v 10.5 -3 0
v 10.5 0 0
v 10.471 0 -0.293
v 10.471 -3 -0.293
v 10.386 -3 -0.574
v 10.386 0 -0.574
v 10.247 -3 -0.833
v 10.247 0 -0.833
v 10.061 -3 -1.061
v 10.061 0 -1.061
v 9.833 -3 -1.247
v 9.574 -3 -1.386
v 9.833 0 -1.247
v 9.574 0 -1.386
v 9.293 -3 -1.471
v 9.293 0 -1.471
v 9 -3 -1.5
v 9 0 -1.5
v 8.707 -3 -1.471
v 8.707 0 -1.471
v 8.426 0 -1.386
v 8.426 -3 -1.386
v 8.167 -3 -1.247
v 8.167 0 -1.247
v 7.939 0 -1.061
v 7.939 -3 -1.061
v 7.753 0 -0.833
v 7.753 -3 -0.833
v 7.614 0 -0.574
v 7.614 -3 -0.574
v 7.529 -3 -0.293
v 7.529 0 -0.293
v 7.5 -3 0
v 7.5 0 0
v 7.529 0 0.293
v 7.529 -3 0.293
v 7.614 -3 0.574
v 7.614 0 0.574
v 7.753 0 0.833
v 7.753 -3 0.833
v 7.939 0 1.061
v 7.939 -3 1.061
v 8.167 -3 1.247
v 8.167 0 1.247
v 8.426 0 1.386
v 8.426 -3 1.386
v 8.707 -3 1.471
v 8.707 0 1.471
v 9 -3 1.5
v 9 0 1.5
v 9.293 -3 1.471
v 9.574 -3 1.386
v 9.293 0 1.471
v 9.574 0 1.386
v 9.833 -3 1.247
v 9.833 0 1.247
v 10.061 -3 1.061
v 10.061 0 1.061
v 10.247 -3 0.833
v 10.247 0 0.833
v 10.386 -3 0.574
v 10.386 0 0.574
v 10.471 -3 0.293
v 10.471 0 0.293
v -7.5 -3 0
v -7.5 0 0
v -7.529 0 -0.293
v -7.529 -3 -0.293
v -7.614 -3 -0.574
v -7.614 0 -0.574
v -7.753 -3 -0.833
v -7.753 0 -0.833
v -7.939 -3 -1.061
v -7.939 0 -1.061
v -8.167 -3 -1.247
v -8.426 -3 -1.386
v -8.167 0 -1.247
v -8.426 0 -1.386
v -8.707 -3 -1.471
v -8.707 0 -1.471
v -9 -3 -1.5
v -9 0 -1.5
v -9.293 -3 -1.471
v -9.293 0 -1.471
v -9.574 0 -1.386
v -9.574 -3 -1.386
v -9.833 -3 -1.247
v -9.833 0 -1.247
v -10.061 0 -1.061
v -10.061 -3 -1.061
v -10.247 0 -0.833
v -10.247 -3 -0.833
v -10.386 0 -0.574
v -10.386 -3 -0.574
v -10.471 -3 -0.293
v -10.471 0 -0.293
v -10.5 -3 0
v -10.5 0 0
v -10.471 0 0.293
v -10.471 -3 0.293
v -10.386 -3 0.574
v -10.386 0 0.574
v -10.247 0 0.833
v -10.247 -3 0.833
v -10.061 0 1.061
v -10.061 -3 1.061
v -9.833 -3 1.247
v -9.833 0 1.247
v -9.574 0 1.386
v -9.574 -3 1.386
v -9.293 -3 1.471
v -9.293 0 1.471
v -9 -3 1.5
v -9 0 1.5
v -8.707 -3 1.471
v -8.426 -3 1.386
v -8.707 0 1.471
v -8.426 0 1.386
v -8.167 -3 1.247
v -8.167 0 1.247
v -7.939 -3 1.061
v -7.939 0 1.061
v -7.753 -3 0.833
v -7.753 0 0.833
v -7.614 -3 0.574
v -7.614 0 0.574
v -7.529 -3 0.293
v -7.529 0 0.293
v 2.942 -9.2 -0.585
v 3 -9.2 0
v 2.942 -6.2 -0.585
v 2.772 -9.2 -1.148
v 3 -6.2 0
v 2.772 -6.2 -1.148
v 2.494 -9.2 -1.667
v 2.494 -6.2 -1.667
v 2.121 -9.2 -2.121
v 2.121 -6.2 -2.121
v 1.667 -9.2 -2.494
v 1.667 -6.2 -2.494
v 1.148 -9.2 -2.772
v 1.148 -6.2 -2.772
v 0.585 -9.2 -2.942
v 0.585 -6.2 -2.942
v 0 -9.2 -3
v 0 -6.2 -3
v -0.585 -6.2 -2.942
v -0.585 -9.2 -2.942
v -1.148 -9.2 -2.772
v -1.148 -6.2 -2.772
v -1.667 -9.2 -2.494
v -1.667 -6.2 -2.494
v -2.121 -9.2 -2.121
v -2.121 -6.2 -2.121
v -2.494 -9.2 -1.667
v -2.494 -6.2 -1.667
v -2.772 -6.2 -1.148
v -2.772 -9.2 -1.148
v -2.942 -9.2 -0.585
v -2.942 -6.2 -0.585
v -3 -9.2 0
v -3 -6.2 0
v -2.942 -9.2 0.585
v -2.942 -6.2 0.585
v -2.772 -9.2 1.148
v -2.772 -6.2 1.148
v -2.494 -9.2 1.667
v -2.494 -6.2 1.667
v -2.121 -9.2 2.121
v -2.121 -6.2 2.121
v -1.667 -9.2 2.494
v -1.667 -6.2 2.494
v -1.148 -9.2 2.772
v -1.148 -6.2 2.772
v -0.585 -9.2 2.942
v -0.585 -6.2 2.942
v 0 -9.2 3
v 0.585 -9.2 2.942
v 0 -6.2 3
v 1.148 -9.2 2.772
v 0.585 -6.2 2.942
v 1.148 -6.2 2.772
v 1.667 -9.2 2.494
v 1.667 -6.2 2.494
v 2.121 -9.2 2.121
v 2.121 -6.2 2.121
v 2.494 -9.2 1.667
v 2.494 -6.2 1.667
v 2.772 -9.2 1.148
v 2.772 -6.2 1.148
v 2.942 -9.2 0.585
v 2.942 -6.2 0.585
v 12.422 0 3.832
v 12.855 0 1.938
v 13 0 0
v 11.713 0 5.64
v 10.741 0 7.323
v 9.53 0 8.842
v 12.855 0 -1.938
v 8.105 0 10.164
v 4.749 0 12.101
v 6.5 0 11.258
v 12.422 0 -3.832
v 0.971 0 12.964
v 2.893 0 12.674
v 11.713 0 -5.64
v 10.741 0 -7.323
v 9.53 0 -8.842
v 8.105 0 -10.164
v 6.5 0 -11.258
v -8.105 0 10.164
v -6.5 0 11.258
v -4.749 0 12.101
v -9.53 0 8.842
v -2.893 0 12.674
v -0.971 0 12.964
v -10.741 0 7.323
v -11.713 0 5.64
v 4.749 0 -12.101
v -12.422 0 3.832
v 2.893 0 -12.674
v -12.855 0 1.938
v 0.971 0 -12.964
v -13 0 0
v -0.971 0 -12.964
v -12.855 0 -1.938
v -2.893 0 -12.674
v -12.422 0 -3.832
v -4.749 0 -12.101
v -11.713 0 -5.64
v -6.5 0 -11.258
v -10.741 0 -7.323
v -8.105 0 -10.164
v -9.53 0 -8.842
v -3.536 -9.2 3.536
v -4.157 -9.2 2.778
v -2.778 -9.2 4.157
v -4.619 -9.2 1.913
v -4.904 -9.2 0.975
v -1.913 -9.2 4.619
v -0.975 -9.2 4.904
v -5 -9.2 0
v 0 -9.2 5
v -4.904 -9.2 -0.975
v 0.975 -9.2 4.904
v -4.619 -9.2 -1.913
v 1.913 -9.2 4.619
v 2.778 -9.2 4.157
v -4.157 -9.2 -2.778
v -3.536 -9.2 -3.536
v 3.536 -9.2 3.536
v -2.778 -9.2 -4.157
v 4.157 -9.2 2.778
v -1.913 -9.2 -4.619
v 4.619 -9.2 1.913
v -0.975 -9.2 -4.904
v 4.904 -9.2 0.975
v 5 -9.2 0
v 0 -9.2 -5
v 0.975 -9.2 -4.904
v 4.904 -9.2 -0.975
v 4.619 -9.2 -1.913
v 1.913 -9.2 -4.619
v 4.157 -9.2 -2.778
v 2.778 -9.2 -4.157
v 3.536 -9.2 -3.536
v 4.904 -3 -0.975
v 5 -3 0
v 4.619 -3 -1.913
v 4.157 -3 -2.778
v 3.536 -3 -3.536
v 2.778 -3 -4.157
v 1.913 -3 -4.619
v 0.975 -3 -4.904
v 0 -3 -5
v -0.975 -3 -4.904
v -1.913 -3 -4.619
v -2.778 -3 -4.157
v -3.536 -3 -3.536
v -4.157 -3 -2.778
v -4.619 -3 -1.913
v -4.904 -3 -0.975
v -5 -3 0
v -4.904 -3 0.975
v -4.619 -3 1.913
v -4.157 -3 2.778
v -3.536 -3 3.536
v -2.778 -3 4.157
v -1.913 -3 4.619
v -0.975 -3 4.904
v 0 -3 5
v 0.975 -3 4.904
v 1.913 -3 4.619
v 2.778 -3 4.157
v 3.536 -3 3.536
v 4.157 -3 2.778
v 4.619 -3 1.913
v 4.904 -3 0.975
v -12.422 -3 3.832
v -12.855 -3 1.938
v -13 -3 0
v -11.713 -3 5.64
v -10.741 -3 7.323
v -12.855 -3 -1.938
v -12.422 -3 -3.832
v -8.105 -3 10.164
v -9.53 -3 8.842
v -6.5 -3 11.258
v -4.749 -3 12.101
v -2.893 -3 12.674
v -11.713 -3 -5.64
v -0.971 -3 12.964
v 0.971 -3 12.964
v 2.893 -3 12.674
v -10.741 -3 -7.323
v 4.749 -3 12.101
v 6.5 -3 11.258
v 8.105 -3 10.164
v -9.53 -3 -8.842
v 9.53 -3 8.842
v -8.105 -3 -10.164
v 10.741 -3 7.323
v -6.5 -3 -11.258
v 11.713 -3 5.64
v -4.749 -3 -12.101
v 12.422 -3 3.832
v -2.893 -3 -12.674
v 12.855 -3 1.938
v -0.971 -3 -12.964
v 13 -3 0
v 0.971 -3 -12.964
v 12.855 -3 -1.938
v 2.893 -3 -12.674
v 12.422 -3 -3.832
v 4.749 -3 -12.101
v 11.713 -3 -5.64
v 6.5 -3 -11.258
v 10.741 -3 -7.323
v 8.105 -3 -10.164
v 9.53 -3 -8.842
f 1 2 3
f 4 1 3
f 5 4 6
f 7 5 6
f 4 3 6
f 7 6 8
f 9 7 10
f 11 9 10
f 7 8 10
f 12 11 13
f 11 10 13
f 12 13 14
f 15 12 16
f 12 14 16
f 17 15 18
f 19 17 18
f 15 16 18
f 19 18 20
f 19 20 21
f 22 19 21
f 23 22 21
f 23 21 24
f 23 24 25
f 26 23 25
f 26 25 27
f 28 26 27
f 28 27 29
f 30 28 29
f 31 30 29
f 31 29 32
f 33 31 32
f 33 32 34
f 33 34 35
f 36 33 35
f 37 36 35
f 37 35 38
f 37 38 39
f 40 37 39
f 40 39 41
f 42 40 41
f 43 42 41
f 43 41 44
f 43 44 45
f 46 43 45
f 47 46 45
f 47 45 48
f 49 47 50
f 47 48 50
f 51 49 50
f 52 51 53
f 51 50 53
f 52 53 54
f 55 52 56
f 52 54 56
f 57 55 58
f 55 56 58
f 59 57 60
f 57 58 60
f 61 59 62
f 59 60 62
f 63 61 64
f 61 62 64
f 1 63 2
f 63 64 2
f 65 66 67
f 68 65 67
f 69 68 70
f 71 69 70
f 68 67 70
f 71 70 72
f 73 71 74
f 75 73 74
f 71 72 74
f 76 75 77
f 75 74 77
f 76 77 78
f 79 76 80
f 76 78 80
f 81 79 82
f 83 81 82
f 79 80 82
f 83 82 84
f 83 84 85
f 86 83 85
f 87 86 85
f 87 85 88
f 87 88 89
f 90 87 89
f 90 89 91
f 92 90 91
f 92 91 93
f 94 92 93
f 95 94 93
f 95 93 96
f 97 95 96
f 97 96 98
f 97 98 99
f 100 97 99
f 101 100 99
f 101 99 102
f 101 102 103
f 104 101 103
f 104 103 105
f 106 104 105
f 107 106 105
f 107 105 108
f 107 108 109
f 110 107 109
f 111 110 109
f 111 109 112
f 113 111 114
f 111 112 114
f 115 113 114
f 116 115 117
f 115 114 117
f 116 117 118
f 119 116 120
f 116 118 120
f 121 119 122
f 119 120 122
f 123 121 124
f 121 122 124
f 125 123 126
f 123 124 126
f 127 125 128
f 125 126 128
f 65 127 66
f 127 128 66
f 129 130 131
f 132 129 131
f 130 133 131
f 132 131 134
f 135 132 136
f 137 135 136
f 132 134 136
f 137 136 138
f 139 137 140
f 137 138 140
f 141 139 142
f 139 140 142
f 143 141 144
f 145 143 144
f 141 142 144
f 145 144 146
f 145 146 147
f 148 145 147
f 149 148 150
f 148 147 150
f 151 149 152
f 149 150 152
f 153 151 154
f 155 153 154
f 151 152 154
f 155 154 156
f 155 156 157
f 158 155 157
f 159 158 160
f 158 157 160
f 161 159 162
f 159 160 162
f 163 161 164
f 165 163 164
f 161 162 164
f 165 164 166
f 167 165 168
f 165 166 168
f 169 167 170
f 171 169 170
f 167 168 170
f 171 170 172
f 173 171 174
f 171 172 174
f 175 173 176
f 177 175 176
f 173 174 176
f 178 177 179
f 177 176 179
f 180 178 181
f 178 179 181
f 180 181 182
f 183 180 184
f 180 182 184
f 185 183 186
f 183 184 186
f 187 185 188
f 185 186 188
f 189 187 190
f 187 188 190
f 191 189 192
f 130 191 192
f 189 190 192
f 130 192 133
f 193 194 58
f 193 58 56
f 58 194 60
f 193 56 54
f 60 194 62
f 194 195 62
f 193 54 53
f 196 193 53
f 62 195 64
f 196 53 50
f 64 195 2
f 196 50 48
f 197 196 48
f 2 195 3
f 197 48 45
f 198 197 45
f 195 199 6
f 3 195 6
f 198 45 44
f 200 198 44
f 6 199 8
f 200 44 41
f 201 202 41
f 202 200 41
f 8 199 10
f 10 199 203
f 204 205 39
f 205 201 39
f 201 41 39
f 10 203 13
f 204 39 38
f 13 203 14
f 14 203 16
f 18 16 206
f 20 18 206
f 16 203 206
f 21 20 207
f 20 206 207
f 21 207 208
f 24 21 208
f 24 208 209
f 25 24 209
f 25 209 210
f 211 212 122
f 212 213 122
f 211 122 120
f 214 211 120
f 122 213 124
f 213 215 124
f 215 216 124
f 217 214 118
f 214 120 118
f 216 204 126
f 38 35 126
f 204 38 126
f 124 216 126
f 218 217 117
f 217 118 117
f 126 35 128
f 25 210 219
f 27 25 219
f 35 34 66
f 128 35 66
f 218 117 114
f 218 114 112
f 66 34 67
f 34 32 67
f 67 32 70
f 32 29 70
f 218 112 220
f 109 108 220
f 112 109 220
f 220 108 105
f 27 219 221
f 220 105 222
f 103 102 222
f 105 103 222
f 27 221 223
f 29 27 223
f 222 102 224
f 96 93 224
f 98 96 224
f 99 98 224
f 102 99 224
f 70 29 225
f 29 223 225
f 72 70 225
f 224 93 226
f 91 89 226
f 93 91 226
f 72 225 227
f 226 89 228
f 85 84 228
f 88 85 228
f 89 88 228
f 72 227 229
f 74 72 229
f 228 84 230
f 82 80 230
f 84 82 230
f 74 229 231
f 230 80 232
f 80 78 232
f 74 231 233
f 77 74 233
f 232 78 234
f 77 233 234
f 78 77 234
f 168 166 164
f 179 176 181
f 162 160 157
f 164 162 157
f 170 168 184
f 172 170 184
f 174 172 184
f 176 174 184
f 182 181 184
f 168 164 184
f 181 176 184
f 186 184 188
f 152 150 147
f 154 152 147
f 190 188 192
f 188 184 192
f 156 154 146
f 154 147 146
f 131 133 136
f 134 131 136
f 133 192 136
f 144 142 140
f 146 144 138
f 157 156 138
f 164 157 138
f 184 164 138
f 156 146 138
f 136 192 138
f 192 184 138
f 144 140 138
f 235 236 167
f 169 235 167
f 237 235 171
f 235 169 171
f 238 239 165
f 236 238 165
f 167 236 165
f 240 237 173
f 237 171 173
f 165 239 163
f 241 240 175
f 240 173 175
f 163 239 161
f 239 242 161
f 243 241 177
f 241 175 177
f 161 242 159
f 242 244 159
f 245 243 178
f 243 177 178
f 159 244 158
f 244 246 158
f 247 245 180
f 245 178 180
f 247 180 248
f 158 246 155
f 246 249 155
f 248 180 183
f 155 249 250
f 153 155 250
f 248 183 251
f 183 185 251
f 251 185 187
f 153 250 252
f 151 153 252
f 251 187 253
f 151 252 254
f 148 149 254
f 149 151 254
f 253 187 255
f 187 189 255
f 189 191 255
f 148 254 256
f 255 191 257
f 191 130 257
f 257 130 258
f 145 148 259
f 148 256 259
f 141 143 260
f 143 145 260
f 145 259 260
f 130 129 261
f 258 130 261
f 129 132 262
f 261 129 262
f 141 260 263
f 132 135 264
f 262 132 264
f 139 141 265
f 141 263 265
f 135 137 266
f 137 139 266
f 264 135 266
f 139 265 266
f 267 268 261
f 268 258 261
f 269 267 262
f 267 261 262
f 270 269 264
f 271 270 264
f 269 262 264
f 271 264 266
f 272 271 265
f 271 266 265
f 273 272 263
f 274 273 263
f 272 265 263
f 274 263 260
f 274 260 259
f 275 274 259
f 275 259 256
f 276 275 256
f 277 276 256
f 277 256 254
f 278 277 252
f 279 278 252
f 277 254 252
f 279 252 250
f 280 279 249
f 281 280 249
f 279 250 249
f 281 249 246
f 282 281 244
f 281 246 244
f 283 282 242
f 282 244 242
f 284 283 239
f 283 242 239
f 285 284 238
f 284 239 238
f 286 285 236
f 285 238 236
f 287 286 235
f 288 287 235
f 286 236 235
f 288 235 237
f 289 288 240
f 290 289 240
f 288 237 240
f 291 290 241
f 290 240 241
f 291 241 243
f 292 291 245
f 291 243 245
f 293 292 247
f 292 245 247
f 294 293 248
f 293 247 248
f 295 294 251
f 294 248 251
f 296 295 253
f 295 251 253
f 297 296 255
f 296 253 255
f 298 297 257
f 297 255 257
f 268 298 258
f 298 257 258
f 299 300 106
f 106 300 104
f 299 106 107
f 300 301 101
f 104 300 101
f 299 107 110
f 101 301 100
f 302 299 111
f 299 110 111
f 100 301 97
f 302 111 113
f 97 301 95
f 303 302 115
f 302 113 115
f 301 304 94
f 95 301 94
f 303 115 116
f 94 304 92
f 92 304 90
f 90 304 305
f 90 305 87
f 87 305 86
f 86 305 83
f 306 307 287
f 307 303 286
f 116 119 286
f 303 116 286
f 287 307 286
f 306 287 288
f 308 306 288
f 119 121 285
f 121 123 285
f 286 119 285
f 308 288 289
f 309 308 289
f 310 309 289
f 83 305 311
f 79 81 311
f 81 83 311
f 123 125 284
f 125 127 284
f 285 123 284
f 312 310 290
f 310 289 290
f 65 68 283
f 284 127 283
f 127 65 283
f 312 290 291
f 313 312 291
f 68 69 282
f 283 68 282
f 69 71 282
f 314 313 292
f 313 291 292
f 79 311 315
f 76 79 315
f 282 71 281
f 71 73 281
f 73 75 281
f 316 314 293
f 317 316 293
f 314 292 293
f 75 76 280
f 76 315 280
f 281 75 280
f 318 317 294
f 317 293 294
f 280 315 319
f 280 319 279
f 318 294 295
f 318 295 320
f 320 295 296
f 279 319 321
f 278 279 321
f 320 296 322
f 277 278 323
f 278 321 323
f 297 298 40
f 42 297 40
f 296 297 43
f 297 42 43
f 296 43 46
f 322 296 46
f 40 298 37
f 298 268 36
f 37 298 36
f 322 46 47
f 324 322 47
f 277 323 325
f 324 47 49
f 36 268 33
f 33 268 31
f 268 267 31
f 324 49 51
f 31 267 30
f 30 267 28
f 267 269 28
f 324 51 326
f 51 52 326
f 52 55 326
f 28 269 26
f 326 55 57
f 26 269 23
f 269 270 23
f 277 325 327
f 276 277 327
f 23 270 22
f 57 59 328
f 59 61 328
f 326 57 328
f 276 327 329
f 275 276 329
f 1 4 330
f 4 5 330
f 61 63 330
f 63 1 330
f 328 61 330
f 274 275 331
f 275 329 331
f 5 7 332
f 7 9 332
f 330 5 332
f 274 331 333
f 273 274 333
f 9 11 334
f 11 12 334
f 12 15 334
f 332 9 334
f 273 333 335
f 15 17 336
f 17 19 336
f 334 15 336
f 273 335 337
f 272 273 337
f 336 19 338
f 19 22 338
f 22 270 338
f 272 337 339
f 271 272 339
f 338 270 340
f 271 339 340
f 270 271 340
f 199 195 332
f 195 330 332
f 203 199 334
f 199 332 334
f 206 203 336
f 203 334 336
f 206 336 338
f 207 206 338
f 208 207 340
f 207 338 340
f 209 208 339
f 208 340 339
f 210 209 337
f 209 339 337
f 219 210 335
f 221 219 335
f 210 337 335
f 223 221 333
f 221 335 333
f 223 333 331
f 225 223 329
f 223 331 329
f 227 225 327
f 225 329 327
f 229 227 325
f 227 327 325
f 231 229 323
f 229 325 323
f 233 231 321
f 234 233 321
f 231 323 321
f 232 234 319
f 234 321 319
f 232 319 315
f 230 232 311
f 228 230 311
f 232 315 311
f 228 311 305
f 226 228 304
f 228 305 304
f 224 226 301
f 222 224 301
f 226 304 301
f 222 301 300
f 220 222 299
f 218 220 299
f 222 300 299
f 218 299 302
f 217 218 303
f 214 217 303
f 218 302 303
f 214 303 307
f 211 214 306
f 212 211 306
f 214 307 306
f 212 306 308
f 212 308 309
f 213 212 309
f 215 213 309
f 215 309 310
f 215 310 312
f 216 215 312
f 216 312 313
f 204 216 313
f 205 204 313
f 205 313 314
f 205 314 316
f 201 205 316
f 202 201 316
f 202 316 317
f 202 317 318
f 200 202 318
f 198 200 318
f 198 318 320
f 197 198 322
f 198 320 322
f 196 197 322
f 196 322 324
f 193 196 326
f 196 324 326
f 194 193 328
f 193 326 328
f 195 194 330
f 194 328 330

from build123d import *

# Parameters (mm, degrees)
SKETCH2_R          = 1.5
CUT_EXTRUDE1_DEPTH = 10.2


with BuildPart() as part:
    # Sketch1 → Revolve1 (revolve)
    with BuildSketch(Plane.XY):
        Polygon((13, 0), (13, -3), (5, -3), (5, -9.2), (3, -9.2), (3, -6.2), (0, -6.2), (0, 0), align=None)
    revolve(axis=Axis((0, 0, 0), (0, 1, 0)))

    # Sketch2 → Cut-Extrude1 (cut, through all)
    with BuildSketch(Plane(origin=(0, 0, 0), x_dir=(1, 0, 0), z_dir=(0, 1, 0))):
        with Locations((9, 0)):
            Circle(SKETCH2_R)
        with Locations((-9, 0)):
            Circle(SKETCH2_R)
    extrude(amount=-CUT_EXTRUDE1_DEPTH, mode=Mode.SUBTRACT)


solid = part.part
